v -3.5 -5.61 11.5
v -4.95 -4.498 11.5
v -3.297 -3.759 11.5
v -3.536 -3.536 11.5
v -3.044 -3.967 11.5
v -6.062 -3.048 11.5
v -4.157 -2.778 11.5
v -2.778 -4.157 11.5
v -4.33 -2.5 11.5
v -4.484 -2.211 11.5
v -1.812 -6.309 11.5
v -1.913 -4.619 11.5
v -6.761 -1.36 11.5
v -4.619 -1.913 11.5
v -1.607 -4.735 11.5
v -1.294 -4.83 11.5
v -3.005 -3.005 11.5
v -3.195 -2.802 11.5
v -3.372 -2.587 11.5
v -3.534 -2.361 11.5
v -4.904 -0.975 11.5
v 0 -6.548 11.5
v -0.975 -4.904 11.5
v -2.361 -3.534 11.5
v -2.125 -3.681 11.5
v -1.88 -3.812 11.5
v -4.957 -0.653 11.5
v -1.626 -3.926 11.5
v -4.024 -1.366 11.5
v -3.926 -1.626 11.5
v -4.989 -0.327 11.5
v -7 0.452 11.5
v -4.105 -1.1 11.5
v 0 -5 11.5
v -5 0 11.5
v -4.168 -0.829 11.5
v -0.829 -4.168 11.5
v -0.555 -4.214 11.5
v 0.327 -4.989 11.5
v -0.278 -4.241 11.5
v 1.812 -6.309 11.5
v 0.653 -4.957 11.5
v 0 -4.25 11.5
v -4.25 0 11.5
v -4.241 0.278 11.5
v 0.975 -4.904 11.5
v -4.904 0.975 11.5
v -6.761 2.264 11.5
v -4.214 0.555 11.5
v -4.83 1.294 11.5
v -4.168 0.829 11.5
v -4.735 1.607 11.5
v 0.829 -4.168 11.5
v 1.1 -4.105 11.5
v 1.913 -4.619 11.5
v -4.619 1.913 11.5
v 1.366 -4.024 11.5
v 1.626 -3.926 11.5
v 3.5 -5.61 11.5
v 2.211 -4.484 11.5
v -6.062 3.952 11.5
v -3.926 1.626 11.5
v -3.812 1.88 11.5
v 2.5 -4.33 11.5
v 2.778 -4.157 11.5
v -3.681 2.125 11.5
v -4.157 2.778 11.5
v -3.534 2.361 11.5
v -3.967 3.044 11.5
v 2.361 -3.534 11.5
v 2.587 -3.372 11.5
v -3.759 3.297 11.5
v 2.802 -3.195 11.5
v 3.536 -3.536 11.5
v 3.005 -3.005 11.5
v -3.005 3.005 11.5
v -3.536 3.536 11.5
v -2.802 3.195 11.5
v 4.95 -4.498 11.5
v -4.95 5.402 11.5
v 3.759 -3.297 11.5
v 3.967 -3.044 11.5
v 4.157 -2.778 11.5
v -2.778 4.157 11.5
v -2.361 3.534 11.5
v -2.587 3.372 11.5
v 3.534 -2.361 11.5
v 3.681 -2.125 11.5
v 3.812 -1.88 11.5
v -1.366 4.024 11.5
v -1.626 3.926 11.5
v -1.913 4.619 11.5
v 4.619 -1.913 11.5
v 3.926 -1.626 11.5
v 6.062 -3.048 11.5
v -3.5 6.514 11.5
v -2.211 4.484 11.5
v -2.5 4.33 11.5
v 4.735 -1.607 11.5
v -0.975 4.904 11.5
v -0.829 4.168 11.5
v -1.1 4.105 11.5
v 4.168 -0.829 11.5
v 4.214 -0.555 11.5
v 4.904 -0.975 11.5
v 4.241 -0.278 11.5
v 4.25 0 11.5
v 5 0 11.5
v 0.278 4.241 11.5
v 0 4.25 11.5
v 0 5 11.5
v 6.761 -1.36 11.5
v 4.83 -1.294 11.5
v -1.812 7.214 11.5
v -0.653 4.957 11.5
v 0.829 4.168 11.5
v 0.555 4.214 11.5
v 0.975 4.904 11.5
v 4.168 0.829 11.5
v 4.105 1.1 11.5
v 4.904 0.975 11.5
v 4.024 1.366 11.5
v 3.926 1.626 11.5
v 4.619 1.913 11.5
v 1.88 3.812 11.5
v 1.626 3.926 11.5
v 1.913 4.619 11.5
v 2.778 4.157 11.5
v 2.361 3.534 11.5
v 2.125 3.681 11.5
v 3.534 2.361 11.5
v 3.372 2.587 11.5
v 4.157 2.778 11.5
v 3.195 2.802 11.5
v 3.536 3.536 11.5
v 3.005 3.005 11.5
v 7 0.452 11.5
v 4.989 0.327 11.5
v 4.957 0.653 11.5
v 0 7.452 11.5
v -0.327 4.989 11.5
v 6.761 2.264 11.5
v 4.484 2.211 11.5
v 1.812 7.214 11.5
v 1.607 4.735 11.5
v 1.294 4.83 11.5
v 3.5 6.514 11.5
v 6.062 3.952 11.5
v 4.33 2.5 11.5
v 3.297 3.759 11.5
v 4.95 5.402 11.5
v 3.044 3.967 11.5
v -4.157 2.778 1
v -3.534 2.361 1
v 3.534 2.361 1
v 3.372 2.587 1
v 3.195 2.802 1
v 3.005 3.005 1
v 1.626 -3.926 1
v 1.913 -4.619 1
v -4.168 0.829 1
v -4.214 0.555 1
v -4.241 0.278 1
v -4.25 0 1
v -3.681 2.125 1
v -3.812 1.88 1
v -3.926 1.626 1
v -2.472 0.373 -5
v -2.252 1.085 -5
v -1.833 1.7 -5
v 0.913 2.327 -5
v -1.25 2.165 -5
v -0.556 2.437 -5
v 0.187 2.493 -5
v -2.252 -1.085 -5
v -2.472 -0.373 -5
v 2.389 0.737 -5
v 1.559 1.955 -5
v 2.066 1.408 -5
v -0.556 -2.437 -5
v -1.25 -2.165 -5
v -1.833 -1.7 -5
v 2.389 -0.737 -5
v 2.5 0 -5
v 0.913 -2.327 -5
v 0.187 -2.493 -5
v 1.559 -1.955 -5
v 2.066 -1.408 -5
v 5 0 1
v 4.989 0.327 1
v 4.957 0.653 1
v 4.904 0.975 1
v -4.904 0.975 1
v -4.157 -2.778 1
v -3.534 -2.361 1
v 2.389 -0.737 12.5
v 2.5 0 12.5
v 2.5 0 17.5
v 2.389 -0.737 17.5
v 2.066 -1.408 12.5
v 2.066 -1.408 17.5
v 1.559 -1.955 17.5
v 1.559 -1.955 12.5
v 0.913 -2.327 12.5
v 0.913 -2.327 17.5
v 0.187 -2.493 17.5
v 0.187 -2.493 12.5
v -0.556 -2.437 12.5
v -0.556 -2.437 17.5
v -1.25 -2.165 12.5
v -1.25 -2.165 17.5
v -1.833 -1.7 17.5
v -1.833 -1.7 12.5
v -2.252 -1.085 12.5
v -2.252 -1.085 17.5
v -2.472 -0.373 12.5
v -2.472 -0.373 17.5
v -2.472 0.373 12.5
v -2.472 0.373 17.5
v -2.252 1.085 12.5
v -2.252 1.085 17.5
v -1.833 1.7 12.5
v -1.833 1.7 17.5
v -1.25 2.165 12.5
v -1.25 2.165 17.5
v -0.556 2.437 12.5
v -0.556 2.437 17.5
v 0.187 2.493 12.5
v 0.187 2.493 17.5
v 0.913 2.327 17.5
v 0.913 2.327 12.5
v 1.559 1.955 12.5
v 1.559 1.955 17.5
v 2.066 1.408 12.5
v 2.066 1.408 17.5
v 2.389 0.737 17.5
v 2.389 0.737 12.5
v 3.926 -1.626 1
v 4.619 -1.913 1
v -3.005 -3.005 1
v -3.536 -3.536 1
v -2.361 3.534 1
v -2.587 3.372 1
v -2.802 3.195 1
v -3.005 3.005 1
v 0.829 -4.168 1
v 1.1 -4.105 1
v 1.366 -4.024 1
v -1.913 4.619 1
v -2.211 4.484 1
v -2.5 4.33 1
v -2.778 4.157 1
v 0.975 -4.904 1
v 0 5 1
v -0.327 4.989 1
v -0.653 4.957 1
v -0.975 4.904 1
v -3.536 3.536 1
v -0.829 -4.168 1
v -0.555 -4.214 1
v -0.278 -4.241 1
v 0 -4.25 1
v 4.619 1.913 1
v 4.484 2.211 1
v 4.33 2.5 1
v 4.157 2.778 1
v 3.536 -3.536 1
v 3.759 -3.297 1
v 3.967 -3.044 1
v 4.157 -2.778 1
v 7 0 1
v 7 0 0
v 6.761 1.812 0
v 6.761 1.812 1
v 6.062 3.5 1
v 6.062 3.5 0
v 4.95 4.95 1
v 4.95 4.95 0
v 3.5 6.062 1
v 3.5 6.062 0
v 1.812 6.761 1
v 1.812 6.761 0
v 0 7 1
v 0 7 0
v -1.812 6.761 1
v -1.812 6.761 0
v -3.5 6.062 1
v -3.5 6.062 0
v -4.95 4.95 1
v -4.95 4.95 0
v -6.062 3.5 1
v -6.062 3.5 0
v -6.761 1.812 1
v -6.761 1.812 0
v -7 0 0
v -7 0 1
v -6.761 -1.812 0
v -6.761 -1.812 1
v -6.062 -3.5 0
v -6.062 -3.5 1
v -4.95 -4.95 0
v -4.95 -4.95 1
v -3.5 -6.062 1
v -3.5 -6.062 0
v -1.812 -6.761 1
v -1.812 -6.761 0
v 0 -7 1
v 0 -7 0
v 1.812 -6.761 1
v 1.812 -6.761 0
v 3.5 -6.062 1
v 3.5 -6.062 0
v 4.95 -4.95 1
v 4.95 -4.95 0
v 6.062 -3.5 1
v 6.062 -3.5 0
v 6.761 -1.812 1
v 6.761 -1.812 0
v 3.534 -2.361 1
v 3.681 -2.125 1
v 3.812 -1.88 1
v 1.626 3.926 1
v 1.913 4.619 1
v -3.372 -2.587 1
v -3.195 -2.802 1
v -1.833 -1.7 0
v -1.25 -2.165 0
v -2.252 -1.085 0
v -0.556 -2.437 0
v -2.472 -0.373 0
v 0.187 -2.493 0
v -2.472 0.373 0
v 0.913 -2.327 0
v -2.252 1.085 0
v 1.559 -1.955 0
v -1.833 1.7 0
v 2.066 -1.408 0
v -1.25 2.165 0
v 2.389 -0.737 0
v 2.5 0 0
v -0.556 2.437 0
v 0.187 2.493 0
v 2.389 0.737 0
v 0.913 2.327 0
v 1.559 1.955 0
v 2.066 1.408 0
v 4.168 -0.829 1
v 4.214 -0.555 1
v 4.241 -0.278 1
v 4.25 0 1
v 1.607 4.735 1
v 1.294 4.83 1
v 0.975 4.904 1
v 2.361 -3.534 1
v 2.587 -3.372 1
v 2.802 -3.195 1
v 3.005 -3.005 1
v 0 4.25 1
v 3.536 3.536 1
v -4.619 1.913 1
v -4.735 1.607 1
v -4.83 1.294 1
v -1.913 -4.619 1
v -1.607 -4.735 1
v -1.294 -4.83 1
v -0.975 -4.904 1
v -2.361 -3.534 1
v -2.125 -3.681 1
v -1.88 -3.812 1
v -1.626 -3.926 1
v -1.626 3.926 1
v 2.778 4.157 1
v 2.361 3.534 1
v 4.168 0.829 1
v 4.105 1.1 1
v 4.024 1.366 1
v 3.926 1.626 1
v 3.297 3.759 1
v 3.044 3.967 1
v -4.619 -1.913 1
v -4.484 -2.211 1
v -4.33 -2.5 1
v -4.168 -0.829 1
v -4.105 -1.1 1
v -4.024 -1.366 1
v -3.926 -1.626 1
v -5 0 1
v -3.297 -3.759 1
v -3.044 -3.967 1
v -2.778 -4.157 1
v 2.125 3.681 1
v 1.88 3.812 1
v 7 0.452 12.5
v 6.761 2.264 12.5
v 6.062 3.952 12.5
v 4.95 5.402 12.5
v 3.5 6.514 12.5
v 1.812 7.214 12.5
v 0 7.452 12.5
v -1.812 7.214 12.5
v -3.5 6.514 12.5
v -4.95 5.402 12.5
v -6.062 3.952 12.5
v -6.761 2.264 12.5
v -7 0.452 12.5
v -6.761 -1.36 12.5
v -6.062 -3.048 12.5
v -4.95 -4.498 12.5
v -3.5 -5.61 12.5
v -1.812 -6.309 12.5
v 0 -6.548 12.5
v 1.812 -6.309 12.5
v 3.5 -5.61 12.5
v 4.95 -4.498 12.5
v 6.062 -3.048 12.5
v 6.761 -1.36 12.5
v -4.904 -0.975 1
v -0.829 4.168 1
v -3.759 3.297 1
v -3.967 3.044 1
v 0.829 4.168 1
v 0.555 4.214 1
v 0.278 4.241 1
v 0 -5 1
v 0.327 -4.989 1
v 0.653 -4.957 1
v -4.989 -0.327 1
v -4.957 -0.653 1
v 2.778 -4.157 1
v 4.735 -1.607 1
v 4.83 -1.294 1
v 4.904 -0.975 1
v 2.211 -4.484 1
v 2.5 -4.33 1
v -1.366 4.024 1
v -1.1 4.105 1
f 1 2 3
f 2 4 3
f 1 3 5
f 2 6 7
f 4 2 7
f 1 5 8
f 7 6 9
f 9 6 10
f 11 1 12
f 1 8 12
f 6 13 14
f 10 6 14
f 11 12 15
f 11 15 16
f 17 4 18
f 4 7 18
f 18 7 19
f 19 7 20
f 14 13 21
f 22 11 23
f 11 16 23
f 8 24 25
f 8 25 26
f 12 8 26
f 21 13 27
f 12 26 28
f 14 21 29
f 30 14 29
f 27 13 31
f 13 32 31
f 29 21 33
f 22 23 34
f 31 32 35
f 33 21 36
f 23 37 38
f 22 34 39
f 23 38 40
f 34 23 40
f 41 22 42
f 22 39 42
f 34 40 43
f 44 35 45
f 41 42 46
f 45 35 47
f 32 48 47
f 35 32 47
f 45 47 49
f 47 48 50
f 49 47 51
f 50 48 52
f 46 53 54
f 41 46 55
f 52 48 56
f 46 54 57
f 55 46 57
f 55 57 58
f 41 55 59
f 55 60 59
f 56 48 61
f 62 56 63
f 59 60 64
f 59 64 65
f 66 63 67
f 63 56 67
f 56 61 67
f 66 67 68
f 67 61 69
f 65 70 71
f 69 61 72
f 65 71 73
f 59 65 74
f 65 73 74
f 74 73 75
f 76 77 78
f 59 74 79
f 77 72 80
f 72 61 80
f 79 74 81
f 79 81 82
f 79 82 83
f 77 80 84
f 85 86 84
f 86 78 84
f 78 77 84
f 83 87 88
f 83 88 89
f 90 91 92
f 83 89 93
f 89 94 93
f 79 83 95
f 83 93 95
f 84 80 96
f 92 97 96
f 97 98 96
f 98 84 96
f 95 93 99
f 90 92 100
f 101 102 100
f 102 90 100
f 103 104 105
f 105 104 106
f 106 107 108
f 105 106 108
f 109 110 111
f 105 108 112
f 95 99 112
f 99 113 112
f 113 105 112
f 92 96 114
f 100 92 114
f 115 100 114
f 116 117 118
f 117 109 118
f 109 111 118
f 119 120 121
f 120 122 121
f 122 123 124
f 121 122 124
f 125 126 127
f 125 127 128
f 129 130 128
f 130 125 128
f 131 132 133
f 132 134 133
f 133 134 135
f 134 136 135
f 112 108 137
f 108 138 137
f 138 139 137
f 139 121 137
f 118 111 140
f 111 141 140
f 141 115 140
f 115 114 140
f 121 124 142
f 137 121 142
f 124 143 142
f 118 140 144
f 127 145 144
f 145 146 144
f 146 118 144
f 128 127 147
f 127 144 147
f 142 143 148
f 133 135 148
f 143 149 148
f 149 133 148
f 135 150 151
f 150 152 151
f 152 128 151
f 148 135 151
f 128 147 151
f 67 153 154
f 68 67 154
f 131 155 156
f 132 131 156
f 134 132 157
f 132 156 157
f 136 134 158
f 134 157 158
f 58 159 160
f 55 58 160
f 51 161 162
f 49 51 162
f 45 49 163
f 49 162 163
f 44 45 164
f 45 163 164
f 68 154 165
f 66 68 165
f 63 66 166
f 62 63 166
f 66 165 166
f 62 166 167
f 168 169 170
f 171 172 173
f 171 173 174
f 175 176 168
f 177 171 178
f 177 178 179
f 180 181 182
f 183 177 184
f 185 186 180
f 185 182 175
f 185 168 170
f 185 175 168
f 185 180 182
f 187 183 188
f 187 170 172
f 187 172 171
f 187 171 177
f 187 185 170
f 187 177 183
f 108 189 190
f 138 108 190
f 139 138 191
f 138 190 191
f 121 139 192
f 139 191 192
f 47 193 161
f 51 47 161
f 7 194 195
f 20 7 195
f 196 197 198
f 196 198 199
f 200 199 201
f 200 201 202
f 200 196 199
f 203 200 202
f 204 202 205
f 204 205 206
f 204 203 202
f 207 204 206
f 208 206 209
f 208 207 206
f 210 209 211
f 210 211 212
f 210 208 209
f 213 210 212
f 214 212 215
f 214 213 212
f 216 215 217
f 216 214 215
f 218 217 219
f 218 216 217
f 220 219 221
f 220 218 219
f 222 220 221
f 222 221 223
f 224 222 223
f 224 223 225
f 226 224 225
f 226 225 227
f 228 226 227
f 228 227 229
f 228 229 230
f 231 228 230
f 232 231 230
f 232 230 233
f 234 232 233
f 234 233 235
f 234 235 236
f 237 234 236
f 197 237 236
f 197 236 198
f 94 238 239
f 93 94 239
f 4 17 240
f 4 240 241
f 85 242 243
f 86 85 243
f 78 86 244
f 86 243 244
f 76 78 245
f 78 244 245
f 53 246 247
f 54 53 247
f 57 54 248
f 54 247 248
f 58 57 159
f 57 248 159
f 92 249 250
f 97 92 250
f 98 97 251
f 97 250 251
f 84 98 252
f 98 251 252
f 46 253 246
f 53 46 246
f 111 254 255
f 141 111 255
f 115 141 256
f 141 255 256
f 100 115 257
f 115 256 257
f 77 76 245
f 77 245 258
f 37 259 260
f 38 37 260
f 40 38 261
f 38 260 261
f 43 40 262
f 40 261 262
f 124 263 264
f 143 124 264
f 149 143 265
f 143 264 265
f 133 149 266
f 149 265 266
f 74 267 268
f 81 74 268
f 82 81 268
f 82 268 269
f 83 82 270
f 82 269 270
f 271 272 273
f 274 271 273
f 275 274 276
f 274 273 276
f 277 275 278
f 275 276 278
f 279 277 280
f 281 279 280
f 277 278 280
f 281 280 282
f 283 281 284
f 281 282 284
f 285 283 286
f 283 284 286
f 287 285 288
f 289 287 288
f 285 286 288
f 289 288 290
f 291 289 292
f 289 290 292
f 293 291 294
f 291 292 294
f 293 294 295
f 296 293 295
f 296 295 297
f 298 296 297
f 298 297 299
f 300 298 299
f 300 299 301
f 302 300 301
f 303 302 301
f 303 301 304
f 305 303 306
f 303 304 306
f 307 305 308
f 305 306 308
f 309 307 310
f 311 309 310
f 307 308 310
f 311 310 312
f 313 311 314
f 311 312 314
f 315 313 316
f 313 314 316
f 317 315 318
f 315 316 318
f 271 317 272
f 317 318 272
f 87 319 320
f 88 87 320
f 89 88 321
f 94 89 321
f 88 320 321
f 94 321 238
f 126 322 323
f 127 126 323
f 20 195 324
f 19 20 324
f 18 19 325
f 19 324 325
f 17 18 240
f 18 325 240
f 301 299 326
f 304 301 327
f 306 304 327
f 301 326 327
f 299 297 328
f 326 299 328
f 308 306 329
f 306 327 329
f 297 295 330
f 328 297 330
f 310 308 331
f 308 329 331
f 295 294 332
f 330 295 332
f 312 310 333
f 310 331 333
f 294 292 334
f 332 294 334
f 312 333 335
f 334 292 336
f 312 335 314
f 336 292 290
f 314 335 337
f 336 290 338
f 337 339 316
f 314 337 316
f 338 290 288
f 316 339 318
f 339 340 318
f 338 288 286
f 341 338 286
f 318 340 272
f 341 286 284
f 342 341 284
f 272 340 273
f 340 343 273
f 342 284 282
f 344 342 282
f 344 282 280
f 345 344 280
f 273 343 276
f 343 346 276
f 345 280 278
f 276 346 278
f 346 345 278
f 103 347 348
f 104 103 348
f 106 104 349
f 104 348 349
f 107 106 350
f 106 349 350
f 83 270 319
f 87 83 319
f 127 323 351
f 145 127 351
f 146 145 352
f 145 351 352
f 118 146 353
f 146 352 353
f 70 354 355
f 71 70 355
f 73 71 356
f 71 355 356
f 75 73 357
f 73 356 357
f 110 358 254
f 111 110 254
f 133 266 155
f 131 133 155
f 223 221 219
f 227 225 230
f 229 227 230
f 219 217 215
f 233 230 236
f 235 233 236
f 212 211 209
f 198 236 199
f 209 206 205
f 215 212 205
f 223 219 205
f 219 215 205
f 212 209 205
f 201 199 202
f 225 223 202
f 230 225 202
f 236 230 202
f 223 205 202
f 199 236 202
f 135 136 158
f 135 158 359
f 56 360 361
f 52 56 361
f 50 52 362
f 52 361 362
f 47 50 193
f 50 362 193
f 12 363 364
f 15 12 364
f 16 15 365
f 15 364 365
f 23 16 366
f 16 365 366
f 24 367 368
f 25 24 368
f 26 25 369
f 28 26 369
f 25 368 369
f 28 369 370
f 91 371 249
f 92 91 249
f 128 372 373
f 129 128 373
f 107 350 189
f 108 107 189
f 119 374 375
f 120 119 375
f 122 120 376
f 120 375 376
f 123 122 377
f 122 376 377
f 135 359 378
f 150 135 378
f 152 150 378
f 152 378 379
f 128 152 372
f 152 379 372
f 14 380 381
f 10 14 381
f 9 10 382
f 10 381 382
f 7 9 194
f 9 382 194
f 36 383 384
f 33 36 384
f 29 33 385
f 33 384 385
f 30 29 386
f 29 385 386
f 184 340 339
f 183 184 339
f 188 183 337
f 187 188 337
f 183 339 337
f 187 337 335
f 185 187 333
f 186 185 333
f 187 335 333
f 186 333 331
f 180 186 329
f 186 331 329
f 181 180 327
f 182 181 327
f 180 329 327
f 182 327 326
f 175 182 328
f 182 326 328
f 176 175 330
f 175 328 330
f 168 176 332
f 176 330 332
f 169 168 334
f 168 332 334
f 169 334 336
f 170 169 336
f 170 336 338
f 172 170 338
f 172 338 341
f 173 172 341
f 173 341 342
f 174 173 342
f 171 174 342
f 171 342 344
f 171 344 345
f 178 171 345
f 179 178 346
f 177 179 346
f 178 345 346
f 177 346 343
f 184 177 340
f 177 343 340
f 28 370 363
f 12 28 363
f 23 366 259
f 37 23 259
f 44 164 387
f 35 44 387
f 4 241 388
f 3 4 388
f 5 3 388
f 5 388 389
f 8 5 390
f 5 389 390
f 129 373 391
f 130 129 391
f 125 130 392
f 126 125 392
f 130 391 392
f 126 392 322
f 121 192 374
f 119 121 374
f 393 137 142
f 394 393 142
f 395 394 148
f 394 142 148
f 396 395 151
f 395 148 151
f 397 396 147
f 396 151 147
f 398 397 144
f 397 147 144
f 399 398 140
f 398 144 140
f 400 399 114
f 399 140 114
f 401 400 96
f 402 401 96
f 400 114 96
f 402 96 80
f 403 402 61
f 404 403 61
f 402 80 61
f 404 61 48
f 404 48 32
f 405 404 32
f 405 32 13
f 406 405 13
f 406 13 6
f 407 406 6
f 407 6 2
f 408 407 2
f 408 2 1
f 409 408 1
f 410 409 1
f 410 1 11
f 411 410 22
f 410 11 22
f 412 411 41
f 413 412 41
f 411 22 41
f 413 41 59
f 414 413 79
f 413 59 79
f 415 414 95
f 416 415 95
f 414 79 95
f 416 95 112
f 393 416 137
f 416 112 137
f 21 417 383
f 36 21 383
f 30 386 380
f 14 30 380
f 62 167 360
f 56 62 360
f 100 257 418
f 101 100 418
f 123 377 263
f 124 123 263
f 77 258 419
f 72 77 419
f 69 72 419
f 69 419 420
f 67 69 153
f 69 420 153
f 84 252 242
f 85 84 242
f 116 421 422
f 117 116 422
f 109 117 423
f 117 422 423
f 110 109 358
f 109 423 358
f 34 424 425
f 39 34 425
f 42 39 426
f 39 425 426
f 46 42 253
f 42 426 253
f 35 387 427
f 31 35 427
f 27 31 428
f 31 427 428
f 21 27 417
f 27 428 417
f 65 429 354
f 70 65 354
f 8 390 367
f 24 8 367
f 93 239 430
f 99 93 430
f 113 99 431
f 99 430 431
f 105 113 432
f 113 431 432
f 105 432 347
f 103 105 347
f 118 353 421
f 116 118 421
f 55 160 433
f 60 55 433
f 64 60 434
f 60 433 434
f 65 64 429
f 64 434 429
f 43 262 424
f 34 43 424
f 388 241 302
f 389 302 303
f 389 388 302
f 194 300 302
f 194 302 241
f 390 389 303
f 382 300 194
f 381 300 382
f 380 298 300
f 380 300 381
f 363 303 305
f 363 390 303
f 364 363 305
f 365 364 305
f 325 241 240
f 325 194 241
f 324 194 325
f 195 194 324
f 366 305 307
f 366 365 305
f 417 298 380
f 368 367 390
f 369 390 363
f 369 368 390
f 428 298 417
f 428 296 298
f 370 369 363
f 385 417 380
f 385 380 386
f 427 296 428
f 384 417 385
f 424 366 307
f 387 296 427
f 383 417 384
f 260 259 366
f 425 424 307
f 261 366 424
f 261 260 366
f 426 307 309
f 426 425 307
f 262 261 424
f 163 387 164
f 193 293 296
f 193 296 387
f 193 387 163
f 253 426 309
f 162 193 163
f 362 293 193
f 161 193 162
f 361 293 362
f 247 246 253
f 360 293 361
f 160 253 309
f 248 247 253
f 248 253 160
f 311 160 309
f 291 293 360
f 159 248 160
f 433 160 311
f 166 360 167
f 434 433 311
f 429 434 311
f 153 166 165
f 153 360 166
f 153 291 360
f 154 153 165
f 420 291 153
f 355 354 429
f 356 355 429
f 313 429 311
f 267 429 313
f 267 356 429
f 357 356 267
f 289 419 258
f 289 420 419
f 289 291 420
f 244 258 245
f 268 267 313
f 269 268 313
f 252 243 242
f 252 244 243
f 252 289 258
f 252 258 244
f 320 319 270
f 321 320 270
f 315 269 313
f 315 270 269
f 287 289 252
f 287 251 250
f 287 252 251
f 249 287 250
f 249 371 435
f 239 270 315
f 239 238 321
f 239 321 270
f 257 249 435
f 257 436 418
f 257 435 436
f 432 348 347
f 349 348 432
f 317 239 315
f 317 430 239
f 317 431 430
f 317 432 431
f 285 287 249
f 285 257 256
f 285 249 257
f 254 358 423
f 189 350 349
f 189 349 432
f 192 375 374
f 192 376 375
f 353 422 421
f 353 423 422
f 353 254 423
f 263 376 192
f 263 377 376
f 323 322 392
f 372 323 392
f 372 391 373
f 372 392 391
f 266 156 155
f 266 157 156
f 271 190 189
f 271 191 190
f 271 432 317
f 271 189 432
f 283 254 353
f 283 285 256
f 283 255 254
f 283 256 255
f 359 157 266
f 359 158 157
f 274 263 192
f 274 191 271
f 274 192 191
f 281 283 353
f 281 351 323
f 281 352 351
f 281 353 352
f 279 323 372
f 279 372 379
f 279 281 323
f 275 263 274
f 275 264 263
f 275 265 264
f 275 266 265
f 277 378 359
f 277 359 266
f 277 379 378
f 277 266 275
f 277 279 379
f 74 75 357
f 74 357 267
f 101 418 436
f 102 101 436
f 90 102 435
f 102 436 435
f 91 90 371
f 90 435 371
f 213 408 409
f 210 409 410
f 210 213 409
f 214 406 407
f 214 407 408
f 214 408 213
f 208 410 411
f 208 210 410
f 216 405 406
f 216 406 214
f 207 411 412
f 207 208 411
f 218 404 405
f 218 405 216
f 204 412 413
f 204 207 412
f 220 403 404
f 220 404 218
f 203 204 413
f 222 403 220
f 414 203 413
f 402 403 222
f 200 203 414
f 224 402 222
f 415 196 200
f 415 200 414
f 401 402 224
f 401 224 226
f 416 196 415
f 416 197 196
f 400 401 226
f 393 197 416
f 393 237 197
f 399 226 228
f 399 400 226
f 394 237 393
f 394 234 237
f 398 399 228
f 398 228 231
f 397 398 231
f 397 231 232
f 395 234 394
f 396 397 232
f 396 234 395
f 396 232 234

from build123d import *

# Parameters (mm, degrees)
F0_R          = 7
F1_DEPTH      = 1
F3_DEPTH      = 10.5
F4_R          = 7
F5_DEPTH      = 1
F6_R          = 2.5
F7_DEPTH      = 5
F7_DEPTH_BACK = 17.5


with BuildPart() as f1:
    # F0 (on Top) → F1 (new body)
    with BuildSketch(Plane.XY):
        Circle(F0_R)
    extrude(amount=F1_DEPTH)

    # F2 (on face) → F3 (join)
    with BuildSketch(Plane.XY.offset(1)):
        with BuildLine():
            ThreePointArc((0.829134, 4.168337), (0.416573, 4.229535), (0, 4.25))
            Line((0, 4.25), (0, 5))
            ThreePointArc((0, 5), (-0.490086, 4.975924), (-0.975452, 4.903926))
            Line((-0.975452, 4.903926), (-0.829134, 4.168337))
            ThreePointArc((-0.829134, 4.168337), (-1.23371, 4.066996), (-1.626405, 3.926488))
            Line((-1.626405, 3.926488), (-1.913417, 4.619398))
            ThreePointArc((-1.913417, 4.619398), (-2.356984, 4.409606), (-2.777851, 4.157348))
            Line((-2.777851, 4.157348), (-2.361173, 3.533746))
            ThreePointArc((-2.361173, 3.533746), (-2.696171, 3.285294), (-3.005204, 3.005204))
            Line((-3.005204, 3.005204), (-3.535534, 3.535534))
            ThreePointArc((-3.535534, 3.535534), (-3.865052, 3.171966), (-4.157348, 2.777851))
            Line((-4.157348, 2.777851), (-3.533746, 2.361173))
            ThreePointArc((-3.533746, 2.361173), (-3.748165, 2.003436), (-3.926488, 1.626405))
            Line((-3.926488, 1.626405), (-4.619398, 1.913417))
            ThreePointArc((-4.619398, 1.913417), (-4.784702, 1.451423), (-4.903926, 0.975452))
            Line((-4.903926, 0.975452), (-4.168337, 0.829134))
            ThreePointArc((-4.168337, 0.829134), (-4.229535, 0.416573), (-4.25, 0))
            Line((-4.25, 0), (-5, 0))
            ThreePointArc((-5, 0), (-4.975924, -0.490086), (-4.903926, -0.975452))
            Line((-4.903926, -0.975452), (-4.168337, -0.829134))
            ThreePointArc((-4.168337, -0.829134), (-4.066996, -1.23371), (-3.926488, -1.626405))
            Line((-3.926488, -1.626405), (-4.619398, -1.913417))
            ThreePointArc((-4.619398, -1.913417), (-4.409606, -2.356984), (-4.157348, -2.777851))
            Line((-4.157348, -2.777851), (-3.533746, -2.361173))
            ThreePointArc((-3.533746, -2.361173), (-3.285294, -2.696171), (-3.005204, -3.005204))
            Line((-3.005204, -3.005204), (-3.535534, -3.535534))
            ThreePointArc((-3.535534, -3.535534), (-3.171966, -3.865052), (-2.777851, -4.157348))
            Line((-2.777851, -4.157348), (-2.361173, -3.533746))
            ThreePointArc((-2.361173, -3.533746), (-2.003436, -3.748165), (-1.626405, -3.926488))
            Line((-1.626405, -3.926488), (-1.913417, -4.619398))
            ThreePointArc((-1.913417, -4.619398), (-1.451423, -4.784702), (-0.975452, -4.903926))
            Line((-0.975452, -4.903926), (-0.829134, -4.168337))
            ThreePointArc((-0.829134, -4.168337), (-0.416573, -4.229535), (0, -4.25))
            Line((0, -4.25), (0, -5))
            ThreePointArc((0, -5), (0.490086, -4.975924), (0.975452, -4.903926))
            Line((0.975452, -4.903926), (0.829134, -4.168337))
            ThreePointArc((0.829134, -4.168337), (1.23371, -4.066996), (1.626405, -3.926488))
            Line((1.626405, -3.926488), (1.913417, -4.619398))
            ThreePointArc((1.913417, -4.619398), (2.356984, -4.409606), (2.777851, -4.157348))
            Line((2.777851, -4.157348), (2.361173, -3.533746))
            ThreePointArc((2.361173, -3.533746), (2.696171, -3.285294), (3.005204, -3.005204))
            Line((3.005204, -3.005204), (3.535534, -3.535534))
            ThreePointArc((3.535534, -3.535534), (3.865052, -3.171966), (4.157348, -2.777851))
            Line((4.157348, -2.777851), (3.533746, -2.361173))
            ThreePointArc((3.533746, -2.361173), (3.748165, -2.003436), (3.926488, -1.626405))
            Line((3.926488, -1.626405), (4.619398, -1.913417))
            ThreePointArc((4.619398, -1.913417), (4.784702, -1.451423), (4.903926, -0.975452))
            Line((4.903926, -0.975452), (4.168337, -0.829134))
            ThreePointArc((4.168337, -0.829134), (4.229535, -0.416573), (4.25, 0))
            Line((4.25, 0), (5, 0))
            ThreePointArc((5, 0), (4.975924, 0.490086), (4.903926, 0.975452))
            Line((4.903926, 0.975452), (4.168337, 0.829134))
            ThreePointArc((4.168337, 0.829134), (4.066996, 1.23371), (3.926488, 1.626405))
            Line((3.926488, 1.626405), (4.619398, 1.913417))
            ThreePointArc((4.619398, 1.913417), (4.409606, 2.356984), (4.157348, 2.777851))
            Line((4.157348, 2.777851), (3.533746, 2.361173))
            ThreePointArc((3.533746, 2.361173), (3.285294, 2.696171), (3.005204, 3.005204))
            Line((3.005204, 3.005204), (3.535534, 3.535534))
            ThreePointArc((3.535534, 3.535534), (3.171966, 3.865052), (2.777851, 4.157348))
            Line((2.777851, 4.157348), (2.361173, 3.533746))
            ThreePointArc((2.361173, 3.533746), (2.003436, 3.748165), (1.626405, 3.926488))
            Line((1.626405, 3.926488), (1.913417, 4.619398))
            ThreePointArc((1.913417, 4.619398), (1.451423, 4.784702), (0.975452, 4.903926))
            Line((0.975452, 4.903926), (0.829134, 4.168337))
        make_face()
    extrude(amount=F3_DEPTH)

    # F4 (on face) → F5 (join)
    with BuildSketch(Plane.XY.offset(11.5)):
        with Locations((0, 0.452107)):
            Circle(F4_R)
    extrude(amount=F5_DEPTH)

    # F6 (on face) → F7 (join, two sides)
    with BuildSketch(Plane(origin=(0, 0, 0), x_dir=(1, 0, 0), z_dir=(0, 0, -1))) as f7_sk:
        Circle(F6_R)
    extrude(amount=F7_DEPTH)
    extrude(f7_sk.sketch, amount=-F7_DEPTH_BACK)


solid = f1.part
